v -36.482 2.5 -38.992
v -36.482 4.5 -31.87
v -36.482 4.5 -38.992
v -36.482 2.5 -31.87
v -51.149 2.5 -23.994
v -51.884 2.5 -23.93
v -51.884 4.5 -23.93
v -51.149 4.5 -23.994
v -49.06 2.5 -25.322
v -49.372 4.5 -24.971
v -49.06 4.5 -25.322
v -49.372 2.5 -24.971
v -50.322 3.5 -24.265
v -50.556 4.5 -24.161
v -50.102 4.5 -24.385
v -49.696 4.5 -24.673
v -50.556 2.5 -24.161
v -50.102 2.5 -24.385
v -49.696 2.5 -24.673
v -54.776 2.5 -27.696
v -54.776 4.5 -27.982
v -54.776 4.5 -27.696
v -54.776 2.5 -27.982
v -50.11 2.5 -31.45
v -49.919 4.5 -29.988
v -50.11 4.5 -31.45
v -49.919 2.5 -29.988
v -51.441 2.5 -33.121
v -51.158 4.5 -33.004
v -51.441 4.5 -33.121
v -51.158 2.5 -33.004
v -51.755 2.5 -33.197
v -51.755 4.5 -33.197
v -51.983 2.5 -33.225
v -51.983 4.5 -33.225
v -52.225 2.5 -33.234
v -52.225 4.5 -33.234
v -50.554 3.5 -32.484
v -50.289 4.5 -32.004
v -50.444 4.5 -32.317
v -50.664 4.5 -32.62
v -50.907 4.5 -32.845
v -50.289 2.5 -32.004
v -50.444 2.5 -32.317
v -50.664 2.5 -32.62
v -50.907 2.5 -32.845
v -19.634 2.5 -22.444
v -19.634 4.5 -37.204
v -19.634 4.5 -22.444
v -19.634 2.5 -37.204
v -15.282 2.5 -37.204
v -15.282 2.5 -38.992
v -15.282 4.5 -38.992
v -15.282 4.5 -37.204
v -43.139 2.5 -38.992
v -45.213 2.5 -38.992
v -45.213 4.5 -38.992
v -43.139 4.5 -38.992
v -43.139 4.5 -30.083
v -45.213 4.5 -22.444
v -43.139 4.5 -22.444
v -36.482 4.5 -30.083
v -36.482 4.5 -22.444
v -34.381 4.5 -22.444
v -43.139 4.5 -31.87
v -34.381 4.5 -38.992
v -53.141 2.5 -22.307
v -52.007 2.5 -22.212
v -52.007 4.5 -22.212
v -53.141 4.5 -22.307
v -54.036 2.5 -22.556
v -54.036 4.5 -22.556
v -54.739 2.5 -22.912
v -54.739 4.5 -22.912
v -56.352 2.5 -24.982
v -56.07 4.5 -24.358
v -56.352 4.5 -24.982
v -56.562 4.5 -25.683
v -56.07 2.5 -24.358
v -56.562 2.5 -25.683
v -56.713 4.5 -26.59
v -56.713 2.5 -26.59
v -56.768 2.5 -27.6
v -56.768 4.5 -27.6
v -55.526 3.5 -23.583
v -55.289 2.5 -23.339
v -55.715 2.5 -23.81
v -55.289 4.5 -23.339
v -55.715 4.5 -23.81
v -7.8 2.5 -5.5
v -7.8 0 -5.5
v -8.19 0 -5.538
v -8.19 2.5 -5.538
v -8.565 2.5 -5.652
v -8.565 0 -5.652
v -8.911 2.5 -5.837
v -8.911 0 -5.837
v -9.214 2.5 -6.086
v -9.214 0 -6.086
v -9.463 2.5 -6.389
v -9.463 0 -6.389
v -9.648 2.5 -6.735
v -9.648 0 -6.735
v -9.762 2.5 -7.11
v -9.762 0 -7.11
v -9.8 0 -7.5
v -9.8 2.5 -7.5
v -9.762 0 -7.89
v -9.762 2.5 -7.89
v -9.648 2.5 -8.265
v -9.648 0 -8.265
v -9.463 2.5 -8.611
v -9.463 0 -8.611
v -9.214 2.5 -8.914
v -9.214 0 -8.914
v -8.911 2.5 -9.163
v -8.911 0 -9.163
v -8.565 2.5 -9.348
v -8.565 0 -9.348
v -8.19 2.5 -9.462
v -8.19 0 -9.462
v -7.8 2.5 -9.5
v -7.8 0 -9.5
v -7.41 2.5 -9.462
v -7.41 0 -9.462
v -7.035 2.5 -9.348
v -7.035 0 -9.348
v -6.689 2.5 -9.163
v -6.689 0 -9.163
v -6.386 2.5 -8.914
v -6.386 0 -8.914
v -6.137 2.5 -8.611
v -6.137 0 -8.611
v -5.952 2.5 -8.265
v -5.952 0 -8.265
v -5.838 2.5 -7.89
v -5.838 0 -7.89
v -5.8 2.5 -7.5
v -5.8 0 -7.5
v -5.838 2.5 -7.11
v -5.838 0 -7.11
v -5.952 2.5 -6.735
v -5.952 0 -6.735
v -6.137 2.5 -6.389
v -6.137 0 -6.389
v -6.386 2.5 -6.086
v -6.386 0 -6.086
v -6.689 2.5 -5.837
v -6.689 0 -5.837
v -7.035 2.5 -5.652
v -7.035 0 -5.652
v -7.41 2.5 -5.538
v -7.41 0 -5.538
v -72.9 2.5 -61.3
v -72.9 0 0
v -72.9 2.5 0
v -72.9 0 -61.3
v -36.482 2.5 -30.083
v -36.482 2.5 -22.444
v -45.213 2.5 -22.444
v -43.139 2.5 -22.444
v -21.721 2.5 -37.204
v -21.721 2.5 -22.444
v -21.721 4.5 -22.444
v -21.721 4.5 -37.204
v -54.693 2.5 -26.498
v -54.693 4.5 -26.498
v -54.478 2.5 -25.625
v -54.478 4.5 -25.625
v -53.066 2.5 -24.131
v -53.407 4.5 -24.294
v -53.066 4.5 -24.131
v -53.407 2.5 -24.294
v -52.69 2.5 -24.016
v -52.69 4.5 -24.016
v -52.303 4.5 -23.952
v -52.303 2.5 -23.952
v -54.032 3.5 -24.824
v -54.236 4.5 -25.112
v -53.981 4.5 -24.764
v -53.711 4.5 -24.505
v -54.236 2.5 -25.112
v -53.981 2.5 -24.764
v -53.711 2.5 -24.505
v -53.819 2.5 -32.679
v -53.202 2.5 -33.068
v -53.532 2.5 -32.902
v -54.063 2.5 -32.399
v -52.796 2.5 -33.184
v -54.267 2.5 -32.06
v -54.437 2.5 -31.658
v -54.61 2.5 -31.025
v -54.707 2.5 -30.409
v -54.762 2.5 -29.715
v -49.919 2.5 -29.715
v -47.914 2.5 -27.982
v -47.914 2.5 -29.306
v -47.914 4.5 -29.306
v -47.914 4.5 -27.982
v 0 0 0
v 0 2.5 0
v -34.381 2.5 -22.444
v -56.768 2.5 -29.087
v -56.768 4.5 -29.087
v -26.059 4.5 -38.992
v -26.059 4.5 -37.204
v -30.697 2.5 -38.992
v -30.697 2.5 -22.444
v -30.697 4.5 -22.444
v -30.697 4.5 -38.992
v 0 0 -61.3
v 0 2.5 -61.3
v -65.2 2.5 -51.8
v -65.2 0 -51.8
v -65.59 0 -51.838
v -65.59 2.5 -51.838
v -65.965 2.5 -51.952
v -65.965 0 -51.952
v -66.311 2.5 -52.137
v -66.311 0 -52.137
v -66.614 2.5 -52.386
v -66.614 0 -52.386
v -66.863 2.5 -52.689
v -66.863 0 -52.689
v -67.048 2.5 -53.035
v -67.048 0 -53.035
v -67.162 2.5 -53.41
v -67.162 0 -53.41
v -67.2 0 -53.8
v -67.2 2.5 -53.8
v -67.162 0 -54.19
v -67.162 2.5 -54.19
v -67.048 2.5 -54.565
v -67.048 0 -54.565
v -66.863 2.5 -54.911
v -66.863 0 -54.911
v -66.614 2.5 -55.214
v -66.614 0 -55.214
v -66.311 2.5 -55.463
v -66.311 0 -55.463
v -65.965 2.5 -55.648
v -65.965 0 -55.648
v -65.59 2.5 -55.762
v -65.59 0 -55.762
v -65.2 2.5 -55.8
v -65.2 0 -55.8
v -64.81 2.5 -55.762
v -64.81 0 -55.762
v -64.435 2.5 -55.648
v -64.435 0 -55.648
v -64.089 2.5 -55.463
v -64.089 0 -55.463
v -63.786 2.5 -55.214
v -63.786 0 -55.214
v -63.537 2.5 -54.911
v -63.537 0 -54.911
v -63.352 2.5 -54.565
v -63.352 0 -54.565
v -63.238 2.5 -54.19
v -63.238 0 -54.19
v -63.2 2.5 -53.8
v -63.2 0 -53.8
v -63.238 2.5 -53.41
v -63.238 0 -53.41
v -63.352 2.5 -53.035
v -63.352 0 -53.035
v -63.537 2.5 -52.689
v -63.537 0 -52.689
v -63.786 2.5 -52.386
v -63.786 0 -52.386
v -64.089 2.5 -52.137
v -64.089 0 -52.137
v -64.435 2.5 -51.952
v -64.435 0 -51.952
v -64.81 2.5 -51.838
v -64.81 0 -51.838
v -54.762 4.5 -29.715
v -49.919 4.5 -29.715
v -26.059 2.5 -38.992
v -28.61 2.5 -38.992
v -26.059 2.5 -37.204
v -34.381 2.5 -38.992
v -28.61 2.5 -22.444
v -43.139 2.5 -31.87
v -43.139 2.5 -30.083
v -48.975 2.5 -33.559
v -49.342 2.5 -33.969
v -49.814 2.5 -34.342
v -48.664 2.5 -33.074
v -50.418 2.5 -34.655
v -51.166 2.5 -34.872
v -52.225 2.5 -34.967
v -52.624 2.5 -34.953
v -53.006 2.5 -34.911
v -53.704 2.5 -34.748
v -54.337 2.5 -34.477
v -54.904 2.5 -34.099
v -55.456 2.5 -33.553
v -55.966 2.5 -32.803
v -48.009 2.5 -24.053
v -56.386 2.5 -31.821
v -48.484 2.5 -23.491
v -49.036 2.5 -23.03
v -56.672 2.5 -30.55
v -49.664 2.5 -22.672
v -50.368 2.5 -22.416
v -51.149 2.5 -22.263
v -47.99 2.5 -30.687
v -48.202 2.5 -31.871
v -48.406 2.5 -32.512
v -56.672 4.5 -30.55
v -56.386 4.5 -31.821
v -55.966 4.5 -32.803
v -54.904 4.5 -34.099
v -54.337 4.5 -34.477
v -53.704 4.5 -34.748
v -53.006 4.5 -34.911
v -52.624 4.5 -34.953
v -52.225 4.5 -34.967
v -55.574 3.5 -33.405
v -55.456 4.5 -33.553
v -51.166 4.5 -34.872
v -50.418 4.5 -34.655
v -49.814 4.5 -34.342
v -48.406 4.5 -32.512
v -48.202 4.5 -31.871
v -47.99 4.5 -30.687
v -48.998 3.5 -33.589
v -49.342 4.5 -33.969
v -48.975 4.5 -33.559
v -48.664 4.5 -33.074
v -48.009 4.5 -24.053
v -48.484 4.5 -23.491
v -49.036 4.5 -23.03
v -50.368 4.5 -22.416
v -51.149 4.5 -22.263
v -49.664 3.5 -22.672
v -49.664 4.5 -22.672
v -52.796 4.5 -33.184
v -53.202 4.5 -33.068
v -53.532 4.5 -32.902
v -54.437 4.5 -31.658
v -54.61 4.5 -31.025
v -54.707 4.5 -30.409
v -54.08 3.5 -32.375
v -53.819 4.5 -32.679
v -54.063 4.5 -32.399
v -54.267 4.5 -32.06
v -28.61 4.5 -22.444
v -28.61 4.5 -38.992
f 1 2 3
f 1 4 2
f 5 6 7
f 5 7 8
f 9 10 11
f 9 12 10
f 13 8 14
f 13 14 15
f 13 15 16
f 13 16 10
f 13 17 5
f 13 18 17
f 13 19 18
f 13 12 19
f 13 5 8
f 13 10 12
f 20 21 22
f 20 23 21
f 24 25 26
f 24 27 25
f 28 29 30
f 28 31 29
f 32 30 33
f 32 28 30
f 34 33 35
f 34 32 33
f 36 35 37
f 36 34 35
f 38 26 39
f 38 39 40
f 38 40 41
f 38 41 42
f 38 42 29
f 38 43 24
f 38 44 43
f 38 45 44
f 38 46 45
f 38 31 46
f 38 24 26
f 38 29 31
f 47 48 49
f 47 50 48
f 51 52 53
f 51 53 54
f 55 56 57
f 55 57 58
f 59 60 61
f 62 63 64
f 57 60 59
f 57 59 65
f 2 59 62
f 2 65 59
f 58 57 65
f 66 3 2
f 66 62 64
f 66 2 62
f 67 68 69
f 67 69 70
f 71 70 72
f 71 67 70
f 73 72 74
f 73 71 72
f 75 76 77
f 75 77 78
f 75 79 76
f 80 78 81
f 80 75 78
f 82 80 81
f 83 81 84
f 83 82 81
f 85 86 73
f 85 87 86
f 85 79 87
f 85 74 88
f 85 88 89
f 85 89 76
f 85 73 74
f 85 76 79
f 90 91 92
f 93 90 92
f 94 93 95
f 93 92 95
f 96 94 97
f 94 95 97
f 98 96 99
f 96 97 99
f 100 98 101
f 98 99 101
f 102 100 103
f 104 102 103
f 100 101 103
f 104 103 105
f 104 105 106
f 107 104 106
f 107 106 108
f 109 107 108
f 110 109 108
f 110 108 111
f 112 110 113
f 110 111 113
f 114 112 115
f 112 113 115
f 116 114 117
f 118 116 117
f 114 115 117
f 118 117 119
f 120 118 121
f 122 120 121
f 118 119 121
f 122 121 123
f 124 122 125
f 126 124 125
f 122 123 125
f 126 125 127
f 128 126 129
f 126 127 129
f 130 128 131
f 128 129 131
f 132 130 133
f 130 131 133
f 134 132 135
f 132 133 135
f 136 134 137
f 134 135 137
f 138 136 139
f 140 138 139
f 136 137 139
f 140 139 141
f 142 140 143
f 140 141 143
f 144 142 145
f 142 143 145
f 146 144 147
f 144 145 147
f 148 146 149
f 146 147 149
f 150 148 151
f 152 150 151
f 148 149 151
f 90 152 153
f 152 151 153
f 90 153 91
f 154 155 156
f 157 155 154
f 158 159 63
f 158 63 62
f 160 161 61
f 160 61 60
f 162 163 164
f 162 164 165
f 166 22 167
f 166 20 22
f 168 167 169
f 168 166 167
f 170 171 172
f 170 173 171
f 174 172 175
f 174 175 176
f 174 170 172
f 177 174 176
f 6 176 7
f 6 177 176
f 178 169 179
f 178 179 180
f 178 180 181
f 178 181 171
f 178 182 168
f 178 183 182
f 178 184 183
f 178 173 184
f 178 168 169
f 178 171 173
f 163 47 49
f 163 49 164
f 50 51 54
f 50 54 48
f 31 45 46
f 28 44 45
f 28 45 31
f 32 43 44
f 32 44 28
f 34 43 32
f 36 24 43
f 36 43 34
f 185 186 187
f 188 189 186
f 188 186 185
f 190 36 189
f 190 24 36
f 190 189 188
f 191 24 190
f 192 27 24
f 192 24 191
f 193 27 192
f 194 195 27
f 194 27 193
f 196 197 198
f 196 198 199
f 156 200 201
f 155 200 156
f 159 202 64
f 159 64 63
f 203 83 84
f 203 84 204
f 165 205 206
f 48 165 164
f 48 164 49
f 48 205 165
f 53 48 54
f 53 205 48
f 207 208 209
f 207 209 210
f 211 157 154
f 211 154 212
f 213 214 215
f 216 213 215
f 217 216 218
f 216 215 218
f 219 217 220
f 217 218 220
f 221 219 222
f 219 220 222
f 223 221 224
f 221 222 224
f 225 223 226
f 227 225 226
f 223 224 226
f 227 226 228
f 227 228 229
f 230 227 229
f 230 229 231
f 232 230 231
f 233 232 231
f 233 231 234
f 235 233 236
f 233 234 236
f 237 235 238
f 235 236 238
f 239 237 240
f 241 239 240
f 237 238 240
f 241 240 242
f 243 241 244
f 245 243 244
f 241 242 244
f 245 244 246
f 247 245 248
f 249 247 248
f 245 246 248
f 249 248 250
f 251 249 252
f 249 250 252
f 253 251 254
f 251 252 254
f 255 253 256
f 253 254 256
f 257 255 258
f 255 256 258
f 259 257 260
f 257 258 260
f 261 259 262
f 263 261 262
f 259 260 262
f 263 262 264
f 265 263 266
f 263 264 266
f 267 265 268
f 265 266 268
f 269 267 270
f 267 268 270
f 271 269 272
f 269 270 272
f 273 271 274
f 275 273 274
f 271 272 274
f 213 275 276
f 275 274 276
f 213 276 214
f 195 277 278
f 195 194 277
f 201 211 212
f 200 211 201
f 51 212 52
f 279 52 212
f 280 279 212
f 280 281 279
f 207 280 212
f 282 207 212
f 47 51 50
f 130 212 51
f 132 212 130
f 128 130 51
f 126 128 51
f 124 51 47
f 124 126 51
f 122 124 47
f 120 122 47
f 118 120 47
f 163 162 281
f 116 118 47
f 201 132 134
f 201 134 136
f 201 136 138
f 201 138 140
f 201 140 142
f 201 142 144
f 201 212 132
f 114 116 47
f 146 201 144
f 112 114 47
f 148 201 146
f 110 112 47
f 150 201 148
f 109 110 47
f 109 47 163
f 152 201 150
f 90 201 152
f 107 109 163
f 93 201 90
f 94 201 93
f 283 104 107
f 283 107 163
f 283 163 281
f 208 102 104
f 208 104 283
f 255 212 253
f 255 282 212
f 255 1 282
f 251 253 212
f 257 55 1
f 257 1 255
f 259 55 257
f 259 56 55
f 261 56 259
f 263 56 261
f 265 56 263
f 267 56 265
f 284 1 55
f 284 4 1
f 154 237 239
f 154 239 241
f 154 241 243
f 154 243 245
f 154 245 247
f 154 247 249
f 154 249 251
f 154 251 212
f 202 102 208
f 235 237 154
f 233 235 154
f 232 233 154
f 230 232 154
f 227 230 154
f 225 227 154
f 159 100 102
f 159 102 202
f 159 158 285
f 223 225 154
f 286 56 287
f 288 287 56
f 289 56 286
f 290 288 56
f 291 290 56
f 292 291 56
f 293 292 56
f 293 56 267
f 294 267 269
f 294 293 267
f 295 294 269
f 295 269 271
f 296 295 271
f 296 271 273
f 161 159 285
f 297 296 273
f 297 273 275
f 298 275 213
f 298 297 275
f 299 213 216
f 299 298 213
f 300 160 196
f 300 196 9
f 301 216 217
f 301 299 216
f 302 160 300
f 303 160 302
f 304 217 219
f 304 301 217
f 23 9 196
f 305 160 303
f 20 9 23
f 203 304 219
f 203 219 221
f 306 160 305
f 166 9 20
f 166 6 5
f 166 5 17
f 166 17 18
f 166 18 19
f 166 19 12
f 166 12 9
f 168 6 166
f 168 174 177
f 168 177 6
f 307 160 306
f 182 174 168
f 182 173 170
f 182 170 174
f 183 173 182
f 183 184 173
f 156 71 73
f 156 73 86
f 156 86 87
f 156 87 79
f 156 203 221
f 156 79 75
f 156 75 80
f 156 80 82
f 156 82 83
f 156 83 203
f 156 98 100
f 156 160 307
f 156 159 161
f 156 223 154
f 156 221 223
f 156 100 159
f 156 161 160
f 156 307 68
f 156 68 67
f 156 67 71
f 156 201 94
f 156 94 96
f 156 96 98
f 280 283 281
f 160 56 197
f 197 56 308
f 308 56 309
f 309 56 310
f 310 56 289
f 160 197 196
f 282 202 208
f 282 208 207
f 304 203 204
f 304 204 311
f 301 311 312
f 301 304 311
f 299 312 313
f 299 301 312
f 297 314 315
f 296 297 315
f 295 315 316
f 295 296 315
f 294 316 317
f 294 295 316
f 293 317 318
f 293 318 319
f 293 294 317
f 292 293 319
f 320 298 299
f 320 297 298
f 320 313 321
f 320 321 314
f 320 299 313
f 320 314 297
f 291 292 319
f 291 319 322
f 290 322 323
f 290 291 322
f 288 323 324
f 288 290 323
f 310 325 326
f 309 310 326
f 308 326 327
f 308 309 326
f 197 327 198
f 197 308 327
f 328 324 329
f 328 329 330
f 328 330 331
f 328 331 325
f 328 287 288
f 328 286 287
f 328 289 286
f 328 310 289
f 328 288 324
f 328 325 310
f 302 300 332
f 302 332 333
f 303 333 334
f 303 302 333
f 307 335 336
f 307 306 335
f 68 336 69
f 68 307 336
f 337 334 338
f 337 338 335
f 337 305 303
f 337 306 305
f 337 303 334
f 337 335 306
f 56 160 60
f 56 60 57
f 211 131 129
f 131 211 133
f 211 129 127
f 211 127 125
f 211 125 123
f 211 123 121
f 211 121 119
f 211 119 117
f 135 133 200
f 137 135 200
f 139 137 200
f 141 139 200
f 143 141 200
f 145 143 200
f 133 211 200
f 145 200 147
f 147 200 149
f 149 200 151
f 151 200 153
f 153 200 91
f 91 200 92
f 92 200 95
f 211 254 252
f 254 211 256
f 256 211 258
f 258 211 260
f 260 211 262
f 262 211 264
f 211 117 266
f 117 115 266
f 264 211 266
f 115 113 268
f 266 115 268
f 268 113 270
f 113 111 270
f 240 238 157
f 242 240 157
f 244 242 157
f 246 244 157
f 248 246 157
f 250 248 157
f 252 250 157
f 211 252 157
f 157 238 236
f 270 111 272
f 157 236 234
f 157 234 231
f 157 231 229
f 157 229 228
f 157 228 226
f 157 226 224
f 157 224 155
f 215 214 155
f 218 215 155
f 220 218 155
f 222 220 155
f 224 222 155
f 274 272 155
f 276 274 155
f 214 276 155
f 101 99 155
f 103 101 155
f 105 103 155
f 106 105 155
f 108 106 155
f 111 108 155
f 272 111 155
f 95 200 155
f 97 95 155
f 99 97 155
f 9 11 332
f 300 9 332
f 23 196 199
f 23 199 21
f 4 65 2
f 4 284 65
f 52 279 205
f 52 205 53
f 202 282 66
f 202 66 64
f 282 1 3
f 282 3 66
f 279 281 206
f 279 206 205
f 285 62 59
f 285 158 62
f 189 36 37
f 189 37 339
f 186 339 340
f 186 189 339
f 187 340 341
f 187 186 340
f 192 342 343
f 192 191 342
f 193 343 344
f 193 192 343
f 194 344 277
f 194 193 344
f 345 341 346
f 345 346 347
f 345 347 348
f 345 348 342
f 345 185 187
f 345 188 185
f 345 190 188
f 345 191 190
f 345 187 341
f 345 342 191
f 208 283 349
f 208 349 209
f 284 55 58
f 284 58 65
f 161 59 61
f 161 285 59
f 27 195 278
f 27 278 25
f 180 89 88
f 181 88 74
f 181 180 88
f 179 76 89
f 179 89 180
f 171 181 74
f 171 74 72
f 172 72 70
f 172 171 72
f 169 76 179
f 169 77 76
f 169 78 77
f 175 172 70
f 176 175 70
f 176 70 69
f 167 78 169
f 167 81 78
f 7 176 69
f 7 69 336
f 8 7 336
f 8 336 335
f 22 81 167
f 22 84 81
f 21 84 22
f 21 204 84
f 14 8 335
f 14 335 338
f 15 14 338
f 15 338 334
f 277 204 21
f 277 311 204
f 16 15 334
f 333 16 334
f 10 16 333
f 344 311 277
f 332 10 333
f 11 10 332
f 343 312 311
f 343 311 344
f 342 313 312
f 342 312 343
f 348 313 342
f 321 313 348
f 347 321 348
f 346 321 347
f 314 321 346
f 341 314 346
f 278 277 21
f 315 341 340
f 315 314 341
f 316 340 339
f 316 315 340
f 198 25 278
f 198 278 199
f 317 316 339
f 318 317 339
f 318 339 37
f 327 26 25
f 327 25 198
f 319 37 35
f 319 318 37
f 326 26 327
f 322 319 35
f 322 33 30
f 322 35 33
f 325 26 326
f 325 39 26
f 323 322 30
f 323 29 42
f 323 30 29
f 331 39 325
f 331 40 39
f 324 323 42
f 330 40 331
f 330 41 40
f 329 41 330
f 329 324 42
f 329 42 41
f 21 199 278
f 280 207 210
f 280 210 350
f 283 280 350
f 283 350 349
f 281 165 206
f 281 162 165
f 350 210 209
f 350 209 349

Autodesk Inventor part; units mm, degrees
ref_plane "YZ Plane" through (0, 0, 0) normal (1, 0, 0) x (0, 1, 0)
ref_plane "XZ Plane" through (0, 0, 0) normal (0, 1, 0) x (-1, 0, 0)
ref_plane "XY Plane" through (0, 0, 0) normal (0, 0, 1) x (1, 0, 0)
sketch "Sketch1" plane through (0, 0, 0) normal (0, 1, 0) x (-1, 0, 0)
  line L0 (0, 0) -> (72.9, 0)
  line L1 (72.9, 0) -> (72.9, -61.3)
  line L2 (72.9, -61.3) -> (0, -61.3)
  line L3 (0, -61.3) -> (0, 0)
  dimension "d0" = 72.9
  dimension "d1" = 61.3
extrude "Extrusion1" add sketch "Sketch1" along normal blind 2.5
sketch "Sketch2" plane through (0, 2.5, 0) normal (0, 1, 0) x (1, 0, 0)
  line L0 (-72.9, 0) -> (0, 0) projected
  line L1 (-72.9, 61.3) -> (-72.9, 0) projected
  line L2 (0, 61.3) -> (-72.9, 61.3) projected
  line L3 (0, 0) -> (0, 61.3) projected
  point P0 (-65.2, 53.8)
  point P1 (-7.8, 7.5)
  dimension "d6" = 7.7
  dimension "d7" = 7.5
  dimension "d8" = 7.5
  dimension "d9" = 7.8
hole "Hole1" at (-65.2, 2.5, -53.8) at (-7.8, 2.5, -7.5) direction (0, -1, 0) diameter 4 end through all
sketch "Sketch3" plane through (0, 2.5, 0) normal (0, 1, 0) x (1, 0, 0)
  line L0 (-57.9, 38.9915) -> (-15.0143, 38.9915) construction
  line L1 (-15.0143, 38.9915) -> (-15.0143, 22.3) construction
  line L2 (-15.0143, 22.3) -> (-57.9, 22.3) construction
  line L3 (-57.9, 22.3) -> (-57.9, 38.9915) construction
  line L4 (-72.9, 61.3) -> (-72.9, 0) projected
  line L5 (-72.9, 0) -> (0, 0) projected
  spline S0 degree 2 poles (-52.0066, 22.2116) (-54.2985, 22.2116) (-56.7541, 24.9537) (-56.7677, 27.6003) knots 0 0 0 1 2 2 2
  line L6 (-56.7677, 27.6003) -> (-56.7677, 29.0873)
  spline S1 degree 2 poles (-56.7677, 29.0873) (-56.7677, 31.843) (-54.3803, 34.9671) (-52.2248, 34.9671) knots 0 0 0 1 2 2 2
  spline S2 degree 2 poles (-52.2248, 34.9671) (-50.0694, 34.9671) (-47.9275, 32.2114) (-47.9139, 29.3056) knots 0 0 0 1 2 2 2
  line L7 (-47.9139, 29.3056) -> (-47.9139, 27.9823)
  line L8 (-47.9139, 27.9823) -> (-54.7759, 27.9823)
  line L9 (-54.7759, 27.9823) -> (-54.7759, 27.6958)
  spline S3 degree 2 poles (-54.7759, 27.6958) (-54.7759, 25.7177) (-53.2889, 23.9305) (-51.8838, 23.9305) knots 0 0 0 1 2 2 2
  spline S4 degree 2 poles (-51.8838, 23.9305) (-50.997, 23.9305) (-49.6465, 24.599) (-49.0598, 25.3221) knots 0 0 0 1 2 2 2
  line L10 (-49.0598, 25.3221) -> (-48.0094, 24.0533)
  spline S5 degree 2 poles (-48.0094, 24.0533) (-49.319, 22.2116) (-52.0066, 22.2116) knots 0 0 0 1 1 1
  spline S6 degree 2 poles (-52.2248, 33.2345) (-53.4799, 33.2345) (-54.6804, 31.5156) (-54.7623, 29.7148) knots 0 0 0 1 2 2 2
  line L11 (-54.7623, 29.7148) -> (-49.9193, 29.7148)
  line L12 (-49.9193, 29.7148) -> (-49.9193, 29.9877)
  spline S7 degree 2 poles (-49.9193, 29.9877) (-50.0012, 31.7339) (-51.1062, 33.2345) (-52.2248, 33.2345) knots 0 0 0 1 2 2 2
  line L13 (-34.3808, 22.4435) -> (-36.4817, 22.4435)
  line L14 (-36.4817, 22.4435) -> (-36.4817, 30.0832)
  line L15 (-36.4817, 30.0832) -> (-43.1391, 30.0832)
  line L16 (-43.1391, 30.0832) -> (-43.1391, 22.4435)
  line L17 (-43.1391, 22.4435) -> (-45.2127, 22.4435)
  line L18 (-45.2127, 22.4435) -> (-45.2127, 38.9915)
  line L19 (-45.2127, 38.9915) -> (-43.1391, 38.9915)
  line L20 (-43.1391, 38.9915) -> (-43.1391, 31.8703)
  line L21 (-43.1391, 31.8703) -> (-36.4817, 31.8703)
  line L22 (-36.4817, 31.8703) -> (-36.4817, 38.9915)
  line L23 (-36.4817, 38.9915) -> (-34.3808, 38.9915)
  line L24 (-34.3808, 38.9915) -> (-34.3808, 22.4435)
  line L25 (-28.6102, 22.4435) -> (-30.6974, 22.4435)
  line L26 (-30.6974, 22.4435) -> (-30.6974, 38.9915)
  line L27 (-30.6974, 38.9915) -> (-28.6102, 38.9915)
  line L28 (-28.6102, 38.9915) -> (-28.6102, 22.4435)
  line L29 (-15.2817, 37.2044) -> (-19.6336, 37.2044)
  line L30 (-19.6336, 37.2044) -> (-19.6336, 22.4435)
  line L31 (-19.6336, 22.4435) -> (-21.7209, 22.4435)
  line L32 (-21.7209, 22.4435) -> (-21.7209, 37.2044)
  line L33 (-21.7209, 37.2044) -> (-26.0591, 37.2044)
  line L34 (-26.0591, 37.2044) -> (-26.0591, 38.9915)
  line L35 (-26.0591, 38.9915) -> (-15.2817, 38.9915)
  line L36 (-15.2817, 38.9915) -> (-15.2817, 37.2044)
  dimension "d17" = 42.8857
  dimension "d18" = 15
  dimension "d19" = 16.6915
  dimension "d20" = 22.3
extrude "Extrusion2" add sketch "Sketch3" along normal blind 2
properties part number "Lid"
